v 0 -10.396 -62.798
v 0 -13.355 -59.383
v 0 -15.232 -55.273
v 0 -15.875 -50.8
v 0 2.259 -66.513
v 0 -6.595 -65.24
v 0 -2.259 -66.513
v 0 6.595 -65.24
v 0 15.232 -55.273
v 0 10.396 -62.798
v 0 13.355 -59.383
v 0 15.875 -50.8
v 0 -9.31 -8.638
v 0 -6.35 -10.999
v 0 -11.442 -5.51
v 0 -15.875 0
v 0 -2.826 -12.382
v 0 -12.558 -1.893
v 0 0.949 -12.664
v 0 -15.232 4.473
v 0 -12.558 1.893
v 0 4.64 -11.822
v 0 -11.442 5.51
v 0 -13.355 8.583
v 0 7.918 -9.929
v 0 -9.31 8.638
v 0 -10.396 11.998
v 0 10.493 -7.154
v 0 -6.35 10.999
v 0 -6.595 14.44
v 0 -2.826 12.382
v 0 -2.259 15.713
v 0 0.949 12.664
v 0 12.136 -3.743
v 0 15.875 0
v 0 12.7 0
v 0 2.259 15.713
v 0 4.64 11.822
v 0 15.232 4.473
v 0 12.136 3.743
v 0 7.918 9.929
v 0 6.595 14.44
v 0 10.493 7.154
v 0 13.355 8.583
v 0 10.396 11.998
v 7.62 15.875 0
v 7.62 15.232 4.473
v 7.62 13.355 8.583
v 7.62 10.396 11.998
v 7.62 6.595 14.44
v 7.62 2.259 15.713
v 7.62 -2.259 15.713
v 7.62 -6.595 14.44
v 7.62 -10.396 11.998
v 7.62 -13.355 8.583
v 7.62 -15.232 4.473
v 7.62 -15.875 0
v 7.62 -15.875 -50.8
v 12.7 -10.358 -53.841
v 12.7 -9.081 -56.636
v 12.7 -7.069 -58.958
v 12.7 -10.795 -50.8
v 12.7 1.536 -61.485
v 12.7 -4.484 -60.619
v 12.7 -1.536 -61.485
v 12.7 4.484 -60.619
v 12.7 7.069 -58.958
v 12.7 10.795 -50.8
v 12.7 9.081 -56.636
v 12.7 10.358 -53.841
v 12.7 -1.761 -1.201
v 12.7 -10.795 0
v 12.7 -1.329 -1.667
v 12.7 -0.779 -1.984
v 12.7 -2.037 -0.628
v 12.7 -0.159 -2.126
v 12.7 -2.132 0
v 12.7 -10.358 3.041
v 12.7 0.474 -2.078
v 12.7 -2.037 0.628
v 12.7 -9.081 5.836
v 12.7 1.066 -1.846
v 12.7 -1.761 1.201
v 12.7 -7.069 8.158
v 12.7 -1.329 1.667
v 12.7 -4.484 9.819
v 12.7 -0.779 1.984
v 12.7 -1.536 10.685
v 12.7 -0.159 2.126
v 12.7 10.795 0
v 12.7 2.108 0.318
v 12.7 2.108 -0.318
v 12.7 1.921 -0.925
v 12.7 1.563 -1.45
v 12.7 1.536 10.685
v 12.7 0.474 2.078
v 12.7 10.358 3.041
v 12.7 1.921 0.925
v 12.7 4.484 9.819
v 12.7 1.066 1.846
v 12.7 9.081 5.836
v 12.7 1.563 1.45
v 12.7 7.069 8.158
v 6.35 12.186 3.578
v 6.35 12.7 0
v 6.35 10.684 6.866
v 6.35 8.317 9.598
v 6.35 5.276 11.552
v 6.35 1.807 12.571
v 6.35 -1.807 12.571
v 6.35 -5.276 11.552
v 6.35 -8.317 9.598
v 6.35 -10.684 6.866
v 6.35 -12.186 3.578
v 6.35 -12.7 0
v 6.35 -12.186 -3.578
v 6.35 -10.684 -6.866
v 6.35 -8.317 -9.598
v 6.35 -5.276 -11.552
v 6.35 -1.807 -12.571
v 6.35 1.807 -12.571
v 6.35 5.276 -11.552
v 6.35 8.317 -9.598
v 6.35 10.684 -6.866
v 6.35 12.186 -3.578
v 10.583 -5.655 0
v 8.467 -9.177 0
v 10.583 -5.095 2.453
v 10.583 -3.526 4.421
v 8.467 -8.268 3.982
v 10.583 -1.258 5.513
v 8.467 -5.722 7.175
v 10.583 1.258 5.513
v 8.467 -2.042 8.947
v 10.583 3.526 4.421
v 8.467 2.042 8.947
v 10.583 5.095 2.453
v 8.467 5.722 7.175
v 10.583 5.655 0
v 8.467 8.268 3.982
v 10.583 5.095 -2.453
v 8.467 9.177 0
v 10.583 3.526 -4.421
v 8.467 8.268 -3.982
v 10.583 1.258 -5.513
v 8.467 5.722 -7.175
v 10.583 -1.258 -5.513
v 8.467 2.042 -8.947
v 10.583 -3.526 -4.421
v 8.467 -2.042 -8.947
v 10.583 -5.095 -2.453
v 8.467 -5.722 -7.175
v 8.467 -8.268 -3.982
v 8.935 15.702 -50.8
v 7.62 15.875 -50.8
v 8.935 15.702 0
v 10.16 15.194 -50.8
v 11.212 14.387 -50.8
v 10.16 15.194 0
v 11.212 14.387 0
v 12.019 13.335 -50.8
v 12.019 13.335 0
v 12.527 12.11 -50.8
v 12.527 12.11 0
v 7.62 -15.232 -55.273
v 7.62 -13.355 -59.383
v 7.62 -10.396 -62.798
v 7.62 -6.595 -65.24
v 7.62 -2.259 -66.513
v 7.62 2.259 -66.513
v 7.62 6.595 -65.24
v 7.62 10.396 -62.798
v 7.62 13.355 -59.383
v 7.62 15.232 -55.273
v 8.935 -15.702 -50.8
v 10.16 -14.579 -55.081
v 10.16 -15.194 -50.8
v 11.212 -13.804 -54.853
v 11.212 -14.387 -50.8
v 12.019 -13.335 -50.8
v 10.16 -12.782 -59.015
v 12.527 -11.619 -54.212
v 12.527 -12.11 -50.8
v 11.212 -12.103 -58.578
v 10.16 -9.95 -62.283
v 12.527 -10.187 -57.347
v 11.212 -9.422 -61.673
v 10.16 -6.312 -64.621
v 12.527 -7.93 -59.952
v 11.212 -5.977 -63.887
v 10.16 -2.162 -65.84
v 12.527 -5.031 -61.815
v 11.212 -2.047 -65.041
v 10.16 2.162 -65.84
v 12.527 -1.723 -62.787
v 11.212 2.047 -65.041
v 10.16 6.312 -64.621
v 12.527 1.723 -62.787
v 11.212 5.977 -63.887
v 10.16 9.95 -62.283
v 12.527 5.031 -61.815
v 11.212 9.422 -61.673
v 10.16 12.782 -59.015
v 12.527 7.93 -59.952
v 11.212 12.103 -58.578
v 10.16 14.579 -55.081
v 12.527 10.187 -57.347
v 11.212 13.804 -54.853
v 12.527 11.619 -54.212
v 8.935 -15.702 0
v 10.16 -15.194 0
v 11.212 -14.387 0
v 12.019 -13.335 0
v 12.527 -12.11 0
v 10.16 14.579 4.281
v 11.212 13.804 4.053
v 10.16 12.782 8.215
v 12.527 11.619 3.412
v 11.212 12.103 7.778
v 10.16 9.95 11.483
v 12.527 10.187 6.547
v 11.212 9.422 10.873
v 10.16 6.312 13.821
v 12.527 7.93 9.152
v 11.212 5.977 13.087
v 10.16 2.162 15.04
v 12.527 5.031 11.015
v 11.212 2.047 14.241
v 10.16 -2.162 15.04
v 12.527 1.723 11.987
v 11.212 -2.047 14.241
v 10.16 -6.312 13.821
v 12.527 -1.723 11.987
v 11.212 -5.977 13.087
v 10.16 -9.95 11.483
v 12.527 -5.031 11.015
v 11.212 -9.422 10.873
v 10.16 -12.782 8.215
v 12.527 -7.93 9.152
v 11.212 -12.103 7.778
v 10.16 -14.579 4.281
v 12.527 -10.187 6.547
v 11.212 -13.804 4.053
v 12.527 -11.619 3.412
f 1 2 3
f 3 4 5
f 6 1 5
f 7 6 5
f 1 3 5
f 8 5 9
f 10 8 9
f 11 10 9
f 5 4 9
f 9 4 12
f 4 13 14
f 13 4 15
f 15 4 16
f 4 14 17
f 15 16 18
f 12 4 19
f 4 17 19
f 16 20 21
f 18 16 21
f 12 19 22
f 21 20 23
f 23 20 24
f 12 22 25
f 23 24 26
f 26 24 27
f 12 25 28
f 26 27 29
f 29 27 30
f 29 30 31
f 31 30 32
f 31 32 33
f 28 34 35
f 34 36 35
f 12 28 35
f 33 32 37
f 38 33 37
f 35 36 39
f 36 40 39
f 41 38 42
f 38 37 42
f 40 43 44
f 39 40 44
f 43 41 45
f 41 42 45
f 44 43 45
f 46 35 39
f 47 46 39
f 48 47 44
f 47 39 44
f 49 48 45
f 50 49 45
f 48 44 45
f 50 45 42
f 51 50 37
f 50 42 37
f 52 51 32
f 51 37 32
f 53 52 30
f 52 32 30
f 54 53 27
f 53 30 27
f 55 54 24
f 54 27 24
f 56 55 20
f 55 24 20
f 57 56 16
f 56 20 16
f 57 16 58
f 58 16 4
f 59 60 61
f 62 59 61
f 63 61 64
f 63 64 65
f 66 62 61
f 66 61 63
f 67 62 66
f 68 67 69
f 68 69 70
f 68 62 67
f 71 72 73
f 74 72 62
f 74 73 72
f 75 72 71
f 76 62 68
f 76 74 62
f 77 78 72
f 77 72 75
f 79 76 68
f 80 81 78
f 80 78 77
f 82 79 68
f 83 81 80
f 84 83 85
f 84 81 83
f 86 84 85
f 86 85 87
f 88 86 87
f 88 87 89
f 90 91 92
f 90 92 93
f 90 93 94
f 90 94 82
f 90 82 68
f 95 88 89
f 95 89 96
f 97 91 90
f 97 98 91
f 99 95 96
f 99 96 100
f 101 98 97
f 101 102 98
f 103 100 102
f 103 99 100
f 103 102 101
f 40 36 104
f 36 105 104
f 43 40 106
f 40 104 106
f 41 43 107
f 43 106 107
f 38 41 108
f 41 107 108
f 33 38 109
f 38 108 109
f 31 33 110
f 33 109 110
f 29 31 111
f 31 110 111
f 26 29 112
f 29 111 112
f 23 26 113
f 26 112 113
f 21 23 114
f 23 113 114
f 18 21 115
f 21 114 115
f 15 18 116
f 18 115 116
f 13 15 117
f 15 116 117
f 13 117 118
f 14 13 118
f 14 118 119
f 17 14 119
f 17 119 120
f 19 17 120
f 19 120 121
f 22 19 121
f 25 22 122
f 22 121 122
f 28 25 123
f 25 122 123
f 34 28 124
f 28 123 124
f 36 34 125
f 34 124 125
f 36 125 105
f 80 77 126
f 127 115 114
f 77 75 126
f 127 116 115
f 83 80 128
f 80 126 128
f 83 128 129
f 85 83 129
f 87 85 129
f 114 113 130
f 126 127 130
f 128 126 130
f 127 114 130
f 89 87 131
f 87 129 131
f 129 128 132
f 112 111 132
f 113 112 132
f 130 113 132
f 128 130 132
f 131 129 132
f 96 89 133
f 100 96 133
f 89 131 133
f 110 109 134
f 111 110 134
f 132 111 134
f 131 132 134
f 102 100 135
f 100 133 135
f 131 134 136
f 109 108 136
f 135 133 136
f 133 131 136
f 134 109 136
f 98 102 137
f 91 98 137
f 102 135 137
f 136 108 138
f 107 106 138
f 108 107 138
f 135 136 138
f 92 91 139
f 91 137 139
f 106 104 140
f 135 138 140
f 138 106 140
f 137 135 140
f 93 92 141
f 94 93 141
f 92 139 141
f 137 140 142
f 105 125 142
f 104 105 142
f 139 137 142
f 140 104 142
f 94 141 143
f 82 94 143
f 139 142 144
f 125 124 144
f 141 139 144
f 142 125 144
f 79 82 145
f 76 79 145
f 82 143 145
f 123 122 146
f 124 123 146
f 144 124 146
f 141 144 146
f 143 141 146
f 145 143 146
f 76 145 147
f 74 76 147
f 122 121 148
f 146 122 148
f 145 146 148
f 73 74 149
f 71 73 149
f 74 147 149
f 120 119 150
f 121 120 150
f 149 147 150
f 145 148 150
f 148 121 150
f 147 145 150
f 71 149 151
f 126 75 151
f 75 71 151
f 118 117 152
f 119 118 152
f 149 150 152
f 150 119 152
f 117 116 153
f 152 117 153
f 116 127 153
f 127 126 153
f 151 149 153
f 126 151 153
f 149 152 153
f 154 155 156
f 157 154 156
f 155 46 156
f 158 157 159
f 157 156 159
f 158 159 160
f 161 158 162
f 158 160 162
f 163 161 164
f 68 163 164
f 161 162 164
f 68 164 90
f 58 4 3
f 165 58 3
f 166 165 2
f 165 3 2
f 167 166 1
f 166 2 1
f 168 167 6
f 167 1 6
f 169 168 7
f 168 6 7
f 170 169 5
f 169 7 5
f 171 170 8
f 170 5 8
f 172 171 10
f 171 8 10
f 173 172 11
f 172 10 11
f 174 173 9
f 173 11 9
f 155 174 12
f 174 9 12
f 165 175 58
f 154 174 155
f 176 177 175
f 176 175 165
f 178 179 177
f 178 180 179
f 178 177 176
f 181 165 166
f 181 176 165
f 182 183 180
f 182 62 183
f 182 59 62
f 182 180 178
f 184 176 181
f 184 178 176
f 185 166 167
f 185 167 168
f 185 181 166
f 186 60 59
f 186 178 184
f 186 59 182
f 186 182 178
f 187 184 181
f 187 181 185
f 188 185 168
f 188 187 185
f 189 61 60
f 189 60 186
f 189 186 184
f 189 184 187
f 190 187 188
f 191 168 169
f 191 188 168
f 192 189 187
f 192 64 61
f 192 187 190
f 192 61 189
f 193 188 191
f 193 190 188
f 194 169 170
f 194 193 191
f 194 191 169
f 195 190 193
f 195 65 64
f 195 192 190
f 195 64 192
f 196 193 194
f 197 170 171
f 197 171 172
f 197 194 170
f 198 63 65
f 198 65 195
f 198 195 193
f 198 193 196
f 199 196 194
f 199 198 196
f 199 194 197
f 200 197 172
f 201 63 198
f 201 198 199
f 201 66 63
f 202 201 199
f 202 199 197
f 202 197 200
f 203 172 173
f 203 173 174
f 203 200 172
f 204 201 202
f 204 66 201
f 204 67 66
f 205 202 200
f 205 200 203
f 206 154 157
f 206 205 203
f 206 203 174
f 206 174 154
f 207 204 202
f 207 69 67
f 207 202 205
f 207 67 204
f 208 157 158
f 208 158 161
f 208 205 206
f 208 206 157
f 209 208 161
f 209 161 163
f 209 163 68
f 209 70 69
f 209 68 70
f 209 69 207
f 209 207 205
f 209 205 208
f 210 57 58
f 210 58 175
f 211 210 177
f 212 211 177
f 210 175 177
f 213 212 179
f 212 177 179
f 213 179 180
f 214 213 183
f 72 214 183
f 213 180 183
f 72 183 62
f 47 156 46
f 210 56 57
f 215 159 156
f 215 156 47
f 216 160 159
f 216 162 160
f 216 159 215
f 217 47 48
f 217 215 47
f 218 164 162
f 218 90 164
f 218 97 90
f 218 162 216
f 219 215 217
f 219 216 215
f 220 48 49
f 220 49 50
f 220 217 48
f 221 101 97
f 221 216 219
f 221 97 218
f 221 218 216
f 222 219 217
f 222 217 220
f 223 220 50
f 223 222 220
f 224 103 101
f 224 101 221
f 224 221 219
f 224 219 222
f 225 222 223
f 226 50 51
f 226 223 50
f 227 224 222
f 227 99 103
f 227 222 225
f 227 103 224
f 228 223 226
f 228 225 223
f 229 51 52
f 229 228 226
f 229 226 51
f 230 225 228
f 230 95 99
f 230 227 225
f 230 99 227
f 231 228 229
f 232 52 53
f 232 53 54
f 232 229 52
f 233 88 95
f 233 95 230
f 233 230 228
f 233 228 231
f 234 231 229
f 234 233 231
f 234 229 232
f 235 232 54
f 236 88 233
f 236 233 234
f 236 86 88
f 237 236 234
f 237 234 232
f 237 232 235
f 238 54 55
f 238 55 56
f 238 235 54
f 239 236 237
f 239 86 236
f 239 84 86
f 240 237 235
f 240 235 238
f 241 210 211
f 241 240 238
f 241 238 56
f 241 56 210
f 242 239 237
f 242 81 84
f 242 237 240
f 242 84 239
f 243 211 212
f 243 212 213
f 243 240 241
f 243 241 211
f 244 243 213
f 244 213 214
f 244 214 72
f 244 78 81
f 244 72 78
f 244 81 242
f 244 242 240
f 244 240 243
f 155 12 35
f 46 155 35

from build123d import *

# Parameters (mm, degrees)
F1_DEPTH = 12.7
F2_R     = 5.08
F4_D     = 25.4
F4_DEPTH = 6.35
F4_TIP   = 7.6309298617


# Not quite as in the source:
# - a feature names something its author has since deleted; it is built from what else it names


with BuildPart() as f1:
    # F0 (on Right) → F1 (new body)
    with BuildSketch(Plane.YZ):
        with BuildLine():
            ThreePointArc((-15.875, 0), (0, -15.875), (15.875, 0))
            ThreePointArc((15.875, 0), (0, 15.875), (-15.875, 0))
        make_face()
        with BuildLine():
            Line((15.875, -50.8), (15.875, 0))
            ThreePointArc((15.875, 0), (0, -15.875), (-15.875, 0))
            Line((-15.875, 0), (-15.875, -50.8))
            ThreePointArc((-15.875, -50.8), (0, -34.925), (15.875, -50.8))
        make_face()
        with BuildLine():
            ThreePointArc((-15.875, -50.8), (0, -66.675), (15.875, -50.8))
            ThreePointArc((15.875, -50.8), (0, -34.925), (-15.875, -50.8))
        make_face()
    extrude(amount=F1_DEPTH)

    # F2
    f2_edges = [f1.edges().sort_by_distance(p)[0] for p in [
        (12.7, 0, 15.875),
        (12.7, -15.875, -25.4),
        (12.7, 0, -66.675),
        (12.7, 15.875, -25.4),
    ]]
    fillet(f2_edges, radius=F2_R)

    # F4
    with Locations(Plane(origin=(0, 0, 0), x_dir=(0, -1, 0), z_dir=(-1, 0, 0))):
        with Locations((0, 0)):
            Hole(F4_D / 2, depth=F4_DEPTH)
            with Locations((0, 0, -(F4_DEPTH + F4_TIP / 2))):  # 118° drill point
                Cone(0, F4_D / 2, F4_TIP, mode=Mode.SUBTRACT)


solid = f1.part
